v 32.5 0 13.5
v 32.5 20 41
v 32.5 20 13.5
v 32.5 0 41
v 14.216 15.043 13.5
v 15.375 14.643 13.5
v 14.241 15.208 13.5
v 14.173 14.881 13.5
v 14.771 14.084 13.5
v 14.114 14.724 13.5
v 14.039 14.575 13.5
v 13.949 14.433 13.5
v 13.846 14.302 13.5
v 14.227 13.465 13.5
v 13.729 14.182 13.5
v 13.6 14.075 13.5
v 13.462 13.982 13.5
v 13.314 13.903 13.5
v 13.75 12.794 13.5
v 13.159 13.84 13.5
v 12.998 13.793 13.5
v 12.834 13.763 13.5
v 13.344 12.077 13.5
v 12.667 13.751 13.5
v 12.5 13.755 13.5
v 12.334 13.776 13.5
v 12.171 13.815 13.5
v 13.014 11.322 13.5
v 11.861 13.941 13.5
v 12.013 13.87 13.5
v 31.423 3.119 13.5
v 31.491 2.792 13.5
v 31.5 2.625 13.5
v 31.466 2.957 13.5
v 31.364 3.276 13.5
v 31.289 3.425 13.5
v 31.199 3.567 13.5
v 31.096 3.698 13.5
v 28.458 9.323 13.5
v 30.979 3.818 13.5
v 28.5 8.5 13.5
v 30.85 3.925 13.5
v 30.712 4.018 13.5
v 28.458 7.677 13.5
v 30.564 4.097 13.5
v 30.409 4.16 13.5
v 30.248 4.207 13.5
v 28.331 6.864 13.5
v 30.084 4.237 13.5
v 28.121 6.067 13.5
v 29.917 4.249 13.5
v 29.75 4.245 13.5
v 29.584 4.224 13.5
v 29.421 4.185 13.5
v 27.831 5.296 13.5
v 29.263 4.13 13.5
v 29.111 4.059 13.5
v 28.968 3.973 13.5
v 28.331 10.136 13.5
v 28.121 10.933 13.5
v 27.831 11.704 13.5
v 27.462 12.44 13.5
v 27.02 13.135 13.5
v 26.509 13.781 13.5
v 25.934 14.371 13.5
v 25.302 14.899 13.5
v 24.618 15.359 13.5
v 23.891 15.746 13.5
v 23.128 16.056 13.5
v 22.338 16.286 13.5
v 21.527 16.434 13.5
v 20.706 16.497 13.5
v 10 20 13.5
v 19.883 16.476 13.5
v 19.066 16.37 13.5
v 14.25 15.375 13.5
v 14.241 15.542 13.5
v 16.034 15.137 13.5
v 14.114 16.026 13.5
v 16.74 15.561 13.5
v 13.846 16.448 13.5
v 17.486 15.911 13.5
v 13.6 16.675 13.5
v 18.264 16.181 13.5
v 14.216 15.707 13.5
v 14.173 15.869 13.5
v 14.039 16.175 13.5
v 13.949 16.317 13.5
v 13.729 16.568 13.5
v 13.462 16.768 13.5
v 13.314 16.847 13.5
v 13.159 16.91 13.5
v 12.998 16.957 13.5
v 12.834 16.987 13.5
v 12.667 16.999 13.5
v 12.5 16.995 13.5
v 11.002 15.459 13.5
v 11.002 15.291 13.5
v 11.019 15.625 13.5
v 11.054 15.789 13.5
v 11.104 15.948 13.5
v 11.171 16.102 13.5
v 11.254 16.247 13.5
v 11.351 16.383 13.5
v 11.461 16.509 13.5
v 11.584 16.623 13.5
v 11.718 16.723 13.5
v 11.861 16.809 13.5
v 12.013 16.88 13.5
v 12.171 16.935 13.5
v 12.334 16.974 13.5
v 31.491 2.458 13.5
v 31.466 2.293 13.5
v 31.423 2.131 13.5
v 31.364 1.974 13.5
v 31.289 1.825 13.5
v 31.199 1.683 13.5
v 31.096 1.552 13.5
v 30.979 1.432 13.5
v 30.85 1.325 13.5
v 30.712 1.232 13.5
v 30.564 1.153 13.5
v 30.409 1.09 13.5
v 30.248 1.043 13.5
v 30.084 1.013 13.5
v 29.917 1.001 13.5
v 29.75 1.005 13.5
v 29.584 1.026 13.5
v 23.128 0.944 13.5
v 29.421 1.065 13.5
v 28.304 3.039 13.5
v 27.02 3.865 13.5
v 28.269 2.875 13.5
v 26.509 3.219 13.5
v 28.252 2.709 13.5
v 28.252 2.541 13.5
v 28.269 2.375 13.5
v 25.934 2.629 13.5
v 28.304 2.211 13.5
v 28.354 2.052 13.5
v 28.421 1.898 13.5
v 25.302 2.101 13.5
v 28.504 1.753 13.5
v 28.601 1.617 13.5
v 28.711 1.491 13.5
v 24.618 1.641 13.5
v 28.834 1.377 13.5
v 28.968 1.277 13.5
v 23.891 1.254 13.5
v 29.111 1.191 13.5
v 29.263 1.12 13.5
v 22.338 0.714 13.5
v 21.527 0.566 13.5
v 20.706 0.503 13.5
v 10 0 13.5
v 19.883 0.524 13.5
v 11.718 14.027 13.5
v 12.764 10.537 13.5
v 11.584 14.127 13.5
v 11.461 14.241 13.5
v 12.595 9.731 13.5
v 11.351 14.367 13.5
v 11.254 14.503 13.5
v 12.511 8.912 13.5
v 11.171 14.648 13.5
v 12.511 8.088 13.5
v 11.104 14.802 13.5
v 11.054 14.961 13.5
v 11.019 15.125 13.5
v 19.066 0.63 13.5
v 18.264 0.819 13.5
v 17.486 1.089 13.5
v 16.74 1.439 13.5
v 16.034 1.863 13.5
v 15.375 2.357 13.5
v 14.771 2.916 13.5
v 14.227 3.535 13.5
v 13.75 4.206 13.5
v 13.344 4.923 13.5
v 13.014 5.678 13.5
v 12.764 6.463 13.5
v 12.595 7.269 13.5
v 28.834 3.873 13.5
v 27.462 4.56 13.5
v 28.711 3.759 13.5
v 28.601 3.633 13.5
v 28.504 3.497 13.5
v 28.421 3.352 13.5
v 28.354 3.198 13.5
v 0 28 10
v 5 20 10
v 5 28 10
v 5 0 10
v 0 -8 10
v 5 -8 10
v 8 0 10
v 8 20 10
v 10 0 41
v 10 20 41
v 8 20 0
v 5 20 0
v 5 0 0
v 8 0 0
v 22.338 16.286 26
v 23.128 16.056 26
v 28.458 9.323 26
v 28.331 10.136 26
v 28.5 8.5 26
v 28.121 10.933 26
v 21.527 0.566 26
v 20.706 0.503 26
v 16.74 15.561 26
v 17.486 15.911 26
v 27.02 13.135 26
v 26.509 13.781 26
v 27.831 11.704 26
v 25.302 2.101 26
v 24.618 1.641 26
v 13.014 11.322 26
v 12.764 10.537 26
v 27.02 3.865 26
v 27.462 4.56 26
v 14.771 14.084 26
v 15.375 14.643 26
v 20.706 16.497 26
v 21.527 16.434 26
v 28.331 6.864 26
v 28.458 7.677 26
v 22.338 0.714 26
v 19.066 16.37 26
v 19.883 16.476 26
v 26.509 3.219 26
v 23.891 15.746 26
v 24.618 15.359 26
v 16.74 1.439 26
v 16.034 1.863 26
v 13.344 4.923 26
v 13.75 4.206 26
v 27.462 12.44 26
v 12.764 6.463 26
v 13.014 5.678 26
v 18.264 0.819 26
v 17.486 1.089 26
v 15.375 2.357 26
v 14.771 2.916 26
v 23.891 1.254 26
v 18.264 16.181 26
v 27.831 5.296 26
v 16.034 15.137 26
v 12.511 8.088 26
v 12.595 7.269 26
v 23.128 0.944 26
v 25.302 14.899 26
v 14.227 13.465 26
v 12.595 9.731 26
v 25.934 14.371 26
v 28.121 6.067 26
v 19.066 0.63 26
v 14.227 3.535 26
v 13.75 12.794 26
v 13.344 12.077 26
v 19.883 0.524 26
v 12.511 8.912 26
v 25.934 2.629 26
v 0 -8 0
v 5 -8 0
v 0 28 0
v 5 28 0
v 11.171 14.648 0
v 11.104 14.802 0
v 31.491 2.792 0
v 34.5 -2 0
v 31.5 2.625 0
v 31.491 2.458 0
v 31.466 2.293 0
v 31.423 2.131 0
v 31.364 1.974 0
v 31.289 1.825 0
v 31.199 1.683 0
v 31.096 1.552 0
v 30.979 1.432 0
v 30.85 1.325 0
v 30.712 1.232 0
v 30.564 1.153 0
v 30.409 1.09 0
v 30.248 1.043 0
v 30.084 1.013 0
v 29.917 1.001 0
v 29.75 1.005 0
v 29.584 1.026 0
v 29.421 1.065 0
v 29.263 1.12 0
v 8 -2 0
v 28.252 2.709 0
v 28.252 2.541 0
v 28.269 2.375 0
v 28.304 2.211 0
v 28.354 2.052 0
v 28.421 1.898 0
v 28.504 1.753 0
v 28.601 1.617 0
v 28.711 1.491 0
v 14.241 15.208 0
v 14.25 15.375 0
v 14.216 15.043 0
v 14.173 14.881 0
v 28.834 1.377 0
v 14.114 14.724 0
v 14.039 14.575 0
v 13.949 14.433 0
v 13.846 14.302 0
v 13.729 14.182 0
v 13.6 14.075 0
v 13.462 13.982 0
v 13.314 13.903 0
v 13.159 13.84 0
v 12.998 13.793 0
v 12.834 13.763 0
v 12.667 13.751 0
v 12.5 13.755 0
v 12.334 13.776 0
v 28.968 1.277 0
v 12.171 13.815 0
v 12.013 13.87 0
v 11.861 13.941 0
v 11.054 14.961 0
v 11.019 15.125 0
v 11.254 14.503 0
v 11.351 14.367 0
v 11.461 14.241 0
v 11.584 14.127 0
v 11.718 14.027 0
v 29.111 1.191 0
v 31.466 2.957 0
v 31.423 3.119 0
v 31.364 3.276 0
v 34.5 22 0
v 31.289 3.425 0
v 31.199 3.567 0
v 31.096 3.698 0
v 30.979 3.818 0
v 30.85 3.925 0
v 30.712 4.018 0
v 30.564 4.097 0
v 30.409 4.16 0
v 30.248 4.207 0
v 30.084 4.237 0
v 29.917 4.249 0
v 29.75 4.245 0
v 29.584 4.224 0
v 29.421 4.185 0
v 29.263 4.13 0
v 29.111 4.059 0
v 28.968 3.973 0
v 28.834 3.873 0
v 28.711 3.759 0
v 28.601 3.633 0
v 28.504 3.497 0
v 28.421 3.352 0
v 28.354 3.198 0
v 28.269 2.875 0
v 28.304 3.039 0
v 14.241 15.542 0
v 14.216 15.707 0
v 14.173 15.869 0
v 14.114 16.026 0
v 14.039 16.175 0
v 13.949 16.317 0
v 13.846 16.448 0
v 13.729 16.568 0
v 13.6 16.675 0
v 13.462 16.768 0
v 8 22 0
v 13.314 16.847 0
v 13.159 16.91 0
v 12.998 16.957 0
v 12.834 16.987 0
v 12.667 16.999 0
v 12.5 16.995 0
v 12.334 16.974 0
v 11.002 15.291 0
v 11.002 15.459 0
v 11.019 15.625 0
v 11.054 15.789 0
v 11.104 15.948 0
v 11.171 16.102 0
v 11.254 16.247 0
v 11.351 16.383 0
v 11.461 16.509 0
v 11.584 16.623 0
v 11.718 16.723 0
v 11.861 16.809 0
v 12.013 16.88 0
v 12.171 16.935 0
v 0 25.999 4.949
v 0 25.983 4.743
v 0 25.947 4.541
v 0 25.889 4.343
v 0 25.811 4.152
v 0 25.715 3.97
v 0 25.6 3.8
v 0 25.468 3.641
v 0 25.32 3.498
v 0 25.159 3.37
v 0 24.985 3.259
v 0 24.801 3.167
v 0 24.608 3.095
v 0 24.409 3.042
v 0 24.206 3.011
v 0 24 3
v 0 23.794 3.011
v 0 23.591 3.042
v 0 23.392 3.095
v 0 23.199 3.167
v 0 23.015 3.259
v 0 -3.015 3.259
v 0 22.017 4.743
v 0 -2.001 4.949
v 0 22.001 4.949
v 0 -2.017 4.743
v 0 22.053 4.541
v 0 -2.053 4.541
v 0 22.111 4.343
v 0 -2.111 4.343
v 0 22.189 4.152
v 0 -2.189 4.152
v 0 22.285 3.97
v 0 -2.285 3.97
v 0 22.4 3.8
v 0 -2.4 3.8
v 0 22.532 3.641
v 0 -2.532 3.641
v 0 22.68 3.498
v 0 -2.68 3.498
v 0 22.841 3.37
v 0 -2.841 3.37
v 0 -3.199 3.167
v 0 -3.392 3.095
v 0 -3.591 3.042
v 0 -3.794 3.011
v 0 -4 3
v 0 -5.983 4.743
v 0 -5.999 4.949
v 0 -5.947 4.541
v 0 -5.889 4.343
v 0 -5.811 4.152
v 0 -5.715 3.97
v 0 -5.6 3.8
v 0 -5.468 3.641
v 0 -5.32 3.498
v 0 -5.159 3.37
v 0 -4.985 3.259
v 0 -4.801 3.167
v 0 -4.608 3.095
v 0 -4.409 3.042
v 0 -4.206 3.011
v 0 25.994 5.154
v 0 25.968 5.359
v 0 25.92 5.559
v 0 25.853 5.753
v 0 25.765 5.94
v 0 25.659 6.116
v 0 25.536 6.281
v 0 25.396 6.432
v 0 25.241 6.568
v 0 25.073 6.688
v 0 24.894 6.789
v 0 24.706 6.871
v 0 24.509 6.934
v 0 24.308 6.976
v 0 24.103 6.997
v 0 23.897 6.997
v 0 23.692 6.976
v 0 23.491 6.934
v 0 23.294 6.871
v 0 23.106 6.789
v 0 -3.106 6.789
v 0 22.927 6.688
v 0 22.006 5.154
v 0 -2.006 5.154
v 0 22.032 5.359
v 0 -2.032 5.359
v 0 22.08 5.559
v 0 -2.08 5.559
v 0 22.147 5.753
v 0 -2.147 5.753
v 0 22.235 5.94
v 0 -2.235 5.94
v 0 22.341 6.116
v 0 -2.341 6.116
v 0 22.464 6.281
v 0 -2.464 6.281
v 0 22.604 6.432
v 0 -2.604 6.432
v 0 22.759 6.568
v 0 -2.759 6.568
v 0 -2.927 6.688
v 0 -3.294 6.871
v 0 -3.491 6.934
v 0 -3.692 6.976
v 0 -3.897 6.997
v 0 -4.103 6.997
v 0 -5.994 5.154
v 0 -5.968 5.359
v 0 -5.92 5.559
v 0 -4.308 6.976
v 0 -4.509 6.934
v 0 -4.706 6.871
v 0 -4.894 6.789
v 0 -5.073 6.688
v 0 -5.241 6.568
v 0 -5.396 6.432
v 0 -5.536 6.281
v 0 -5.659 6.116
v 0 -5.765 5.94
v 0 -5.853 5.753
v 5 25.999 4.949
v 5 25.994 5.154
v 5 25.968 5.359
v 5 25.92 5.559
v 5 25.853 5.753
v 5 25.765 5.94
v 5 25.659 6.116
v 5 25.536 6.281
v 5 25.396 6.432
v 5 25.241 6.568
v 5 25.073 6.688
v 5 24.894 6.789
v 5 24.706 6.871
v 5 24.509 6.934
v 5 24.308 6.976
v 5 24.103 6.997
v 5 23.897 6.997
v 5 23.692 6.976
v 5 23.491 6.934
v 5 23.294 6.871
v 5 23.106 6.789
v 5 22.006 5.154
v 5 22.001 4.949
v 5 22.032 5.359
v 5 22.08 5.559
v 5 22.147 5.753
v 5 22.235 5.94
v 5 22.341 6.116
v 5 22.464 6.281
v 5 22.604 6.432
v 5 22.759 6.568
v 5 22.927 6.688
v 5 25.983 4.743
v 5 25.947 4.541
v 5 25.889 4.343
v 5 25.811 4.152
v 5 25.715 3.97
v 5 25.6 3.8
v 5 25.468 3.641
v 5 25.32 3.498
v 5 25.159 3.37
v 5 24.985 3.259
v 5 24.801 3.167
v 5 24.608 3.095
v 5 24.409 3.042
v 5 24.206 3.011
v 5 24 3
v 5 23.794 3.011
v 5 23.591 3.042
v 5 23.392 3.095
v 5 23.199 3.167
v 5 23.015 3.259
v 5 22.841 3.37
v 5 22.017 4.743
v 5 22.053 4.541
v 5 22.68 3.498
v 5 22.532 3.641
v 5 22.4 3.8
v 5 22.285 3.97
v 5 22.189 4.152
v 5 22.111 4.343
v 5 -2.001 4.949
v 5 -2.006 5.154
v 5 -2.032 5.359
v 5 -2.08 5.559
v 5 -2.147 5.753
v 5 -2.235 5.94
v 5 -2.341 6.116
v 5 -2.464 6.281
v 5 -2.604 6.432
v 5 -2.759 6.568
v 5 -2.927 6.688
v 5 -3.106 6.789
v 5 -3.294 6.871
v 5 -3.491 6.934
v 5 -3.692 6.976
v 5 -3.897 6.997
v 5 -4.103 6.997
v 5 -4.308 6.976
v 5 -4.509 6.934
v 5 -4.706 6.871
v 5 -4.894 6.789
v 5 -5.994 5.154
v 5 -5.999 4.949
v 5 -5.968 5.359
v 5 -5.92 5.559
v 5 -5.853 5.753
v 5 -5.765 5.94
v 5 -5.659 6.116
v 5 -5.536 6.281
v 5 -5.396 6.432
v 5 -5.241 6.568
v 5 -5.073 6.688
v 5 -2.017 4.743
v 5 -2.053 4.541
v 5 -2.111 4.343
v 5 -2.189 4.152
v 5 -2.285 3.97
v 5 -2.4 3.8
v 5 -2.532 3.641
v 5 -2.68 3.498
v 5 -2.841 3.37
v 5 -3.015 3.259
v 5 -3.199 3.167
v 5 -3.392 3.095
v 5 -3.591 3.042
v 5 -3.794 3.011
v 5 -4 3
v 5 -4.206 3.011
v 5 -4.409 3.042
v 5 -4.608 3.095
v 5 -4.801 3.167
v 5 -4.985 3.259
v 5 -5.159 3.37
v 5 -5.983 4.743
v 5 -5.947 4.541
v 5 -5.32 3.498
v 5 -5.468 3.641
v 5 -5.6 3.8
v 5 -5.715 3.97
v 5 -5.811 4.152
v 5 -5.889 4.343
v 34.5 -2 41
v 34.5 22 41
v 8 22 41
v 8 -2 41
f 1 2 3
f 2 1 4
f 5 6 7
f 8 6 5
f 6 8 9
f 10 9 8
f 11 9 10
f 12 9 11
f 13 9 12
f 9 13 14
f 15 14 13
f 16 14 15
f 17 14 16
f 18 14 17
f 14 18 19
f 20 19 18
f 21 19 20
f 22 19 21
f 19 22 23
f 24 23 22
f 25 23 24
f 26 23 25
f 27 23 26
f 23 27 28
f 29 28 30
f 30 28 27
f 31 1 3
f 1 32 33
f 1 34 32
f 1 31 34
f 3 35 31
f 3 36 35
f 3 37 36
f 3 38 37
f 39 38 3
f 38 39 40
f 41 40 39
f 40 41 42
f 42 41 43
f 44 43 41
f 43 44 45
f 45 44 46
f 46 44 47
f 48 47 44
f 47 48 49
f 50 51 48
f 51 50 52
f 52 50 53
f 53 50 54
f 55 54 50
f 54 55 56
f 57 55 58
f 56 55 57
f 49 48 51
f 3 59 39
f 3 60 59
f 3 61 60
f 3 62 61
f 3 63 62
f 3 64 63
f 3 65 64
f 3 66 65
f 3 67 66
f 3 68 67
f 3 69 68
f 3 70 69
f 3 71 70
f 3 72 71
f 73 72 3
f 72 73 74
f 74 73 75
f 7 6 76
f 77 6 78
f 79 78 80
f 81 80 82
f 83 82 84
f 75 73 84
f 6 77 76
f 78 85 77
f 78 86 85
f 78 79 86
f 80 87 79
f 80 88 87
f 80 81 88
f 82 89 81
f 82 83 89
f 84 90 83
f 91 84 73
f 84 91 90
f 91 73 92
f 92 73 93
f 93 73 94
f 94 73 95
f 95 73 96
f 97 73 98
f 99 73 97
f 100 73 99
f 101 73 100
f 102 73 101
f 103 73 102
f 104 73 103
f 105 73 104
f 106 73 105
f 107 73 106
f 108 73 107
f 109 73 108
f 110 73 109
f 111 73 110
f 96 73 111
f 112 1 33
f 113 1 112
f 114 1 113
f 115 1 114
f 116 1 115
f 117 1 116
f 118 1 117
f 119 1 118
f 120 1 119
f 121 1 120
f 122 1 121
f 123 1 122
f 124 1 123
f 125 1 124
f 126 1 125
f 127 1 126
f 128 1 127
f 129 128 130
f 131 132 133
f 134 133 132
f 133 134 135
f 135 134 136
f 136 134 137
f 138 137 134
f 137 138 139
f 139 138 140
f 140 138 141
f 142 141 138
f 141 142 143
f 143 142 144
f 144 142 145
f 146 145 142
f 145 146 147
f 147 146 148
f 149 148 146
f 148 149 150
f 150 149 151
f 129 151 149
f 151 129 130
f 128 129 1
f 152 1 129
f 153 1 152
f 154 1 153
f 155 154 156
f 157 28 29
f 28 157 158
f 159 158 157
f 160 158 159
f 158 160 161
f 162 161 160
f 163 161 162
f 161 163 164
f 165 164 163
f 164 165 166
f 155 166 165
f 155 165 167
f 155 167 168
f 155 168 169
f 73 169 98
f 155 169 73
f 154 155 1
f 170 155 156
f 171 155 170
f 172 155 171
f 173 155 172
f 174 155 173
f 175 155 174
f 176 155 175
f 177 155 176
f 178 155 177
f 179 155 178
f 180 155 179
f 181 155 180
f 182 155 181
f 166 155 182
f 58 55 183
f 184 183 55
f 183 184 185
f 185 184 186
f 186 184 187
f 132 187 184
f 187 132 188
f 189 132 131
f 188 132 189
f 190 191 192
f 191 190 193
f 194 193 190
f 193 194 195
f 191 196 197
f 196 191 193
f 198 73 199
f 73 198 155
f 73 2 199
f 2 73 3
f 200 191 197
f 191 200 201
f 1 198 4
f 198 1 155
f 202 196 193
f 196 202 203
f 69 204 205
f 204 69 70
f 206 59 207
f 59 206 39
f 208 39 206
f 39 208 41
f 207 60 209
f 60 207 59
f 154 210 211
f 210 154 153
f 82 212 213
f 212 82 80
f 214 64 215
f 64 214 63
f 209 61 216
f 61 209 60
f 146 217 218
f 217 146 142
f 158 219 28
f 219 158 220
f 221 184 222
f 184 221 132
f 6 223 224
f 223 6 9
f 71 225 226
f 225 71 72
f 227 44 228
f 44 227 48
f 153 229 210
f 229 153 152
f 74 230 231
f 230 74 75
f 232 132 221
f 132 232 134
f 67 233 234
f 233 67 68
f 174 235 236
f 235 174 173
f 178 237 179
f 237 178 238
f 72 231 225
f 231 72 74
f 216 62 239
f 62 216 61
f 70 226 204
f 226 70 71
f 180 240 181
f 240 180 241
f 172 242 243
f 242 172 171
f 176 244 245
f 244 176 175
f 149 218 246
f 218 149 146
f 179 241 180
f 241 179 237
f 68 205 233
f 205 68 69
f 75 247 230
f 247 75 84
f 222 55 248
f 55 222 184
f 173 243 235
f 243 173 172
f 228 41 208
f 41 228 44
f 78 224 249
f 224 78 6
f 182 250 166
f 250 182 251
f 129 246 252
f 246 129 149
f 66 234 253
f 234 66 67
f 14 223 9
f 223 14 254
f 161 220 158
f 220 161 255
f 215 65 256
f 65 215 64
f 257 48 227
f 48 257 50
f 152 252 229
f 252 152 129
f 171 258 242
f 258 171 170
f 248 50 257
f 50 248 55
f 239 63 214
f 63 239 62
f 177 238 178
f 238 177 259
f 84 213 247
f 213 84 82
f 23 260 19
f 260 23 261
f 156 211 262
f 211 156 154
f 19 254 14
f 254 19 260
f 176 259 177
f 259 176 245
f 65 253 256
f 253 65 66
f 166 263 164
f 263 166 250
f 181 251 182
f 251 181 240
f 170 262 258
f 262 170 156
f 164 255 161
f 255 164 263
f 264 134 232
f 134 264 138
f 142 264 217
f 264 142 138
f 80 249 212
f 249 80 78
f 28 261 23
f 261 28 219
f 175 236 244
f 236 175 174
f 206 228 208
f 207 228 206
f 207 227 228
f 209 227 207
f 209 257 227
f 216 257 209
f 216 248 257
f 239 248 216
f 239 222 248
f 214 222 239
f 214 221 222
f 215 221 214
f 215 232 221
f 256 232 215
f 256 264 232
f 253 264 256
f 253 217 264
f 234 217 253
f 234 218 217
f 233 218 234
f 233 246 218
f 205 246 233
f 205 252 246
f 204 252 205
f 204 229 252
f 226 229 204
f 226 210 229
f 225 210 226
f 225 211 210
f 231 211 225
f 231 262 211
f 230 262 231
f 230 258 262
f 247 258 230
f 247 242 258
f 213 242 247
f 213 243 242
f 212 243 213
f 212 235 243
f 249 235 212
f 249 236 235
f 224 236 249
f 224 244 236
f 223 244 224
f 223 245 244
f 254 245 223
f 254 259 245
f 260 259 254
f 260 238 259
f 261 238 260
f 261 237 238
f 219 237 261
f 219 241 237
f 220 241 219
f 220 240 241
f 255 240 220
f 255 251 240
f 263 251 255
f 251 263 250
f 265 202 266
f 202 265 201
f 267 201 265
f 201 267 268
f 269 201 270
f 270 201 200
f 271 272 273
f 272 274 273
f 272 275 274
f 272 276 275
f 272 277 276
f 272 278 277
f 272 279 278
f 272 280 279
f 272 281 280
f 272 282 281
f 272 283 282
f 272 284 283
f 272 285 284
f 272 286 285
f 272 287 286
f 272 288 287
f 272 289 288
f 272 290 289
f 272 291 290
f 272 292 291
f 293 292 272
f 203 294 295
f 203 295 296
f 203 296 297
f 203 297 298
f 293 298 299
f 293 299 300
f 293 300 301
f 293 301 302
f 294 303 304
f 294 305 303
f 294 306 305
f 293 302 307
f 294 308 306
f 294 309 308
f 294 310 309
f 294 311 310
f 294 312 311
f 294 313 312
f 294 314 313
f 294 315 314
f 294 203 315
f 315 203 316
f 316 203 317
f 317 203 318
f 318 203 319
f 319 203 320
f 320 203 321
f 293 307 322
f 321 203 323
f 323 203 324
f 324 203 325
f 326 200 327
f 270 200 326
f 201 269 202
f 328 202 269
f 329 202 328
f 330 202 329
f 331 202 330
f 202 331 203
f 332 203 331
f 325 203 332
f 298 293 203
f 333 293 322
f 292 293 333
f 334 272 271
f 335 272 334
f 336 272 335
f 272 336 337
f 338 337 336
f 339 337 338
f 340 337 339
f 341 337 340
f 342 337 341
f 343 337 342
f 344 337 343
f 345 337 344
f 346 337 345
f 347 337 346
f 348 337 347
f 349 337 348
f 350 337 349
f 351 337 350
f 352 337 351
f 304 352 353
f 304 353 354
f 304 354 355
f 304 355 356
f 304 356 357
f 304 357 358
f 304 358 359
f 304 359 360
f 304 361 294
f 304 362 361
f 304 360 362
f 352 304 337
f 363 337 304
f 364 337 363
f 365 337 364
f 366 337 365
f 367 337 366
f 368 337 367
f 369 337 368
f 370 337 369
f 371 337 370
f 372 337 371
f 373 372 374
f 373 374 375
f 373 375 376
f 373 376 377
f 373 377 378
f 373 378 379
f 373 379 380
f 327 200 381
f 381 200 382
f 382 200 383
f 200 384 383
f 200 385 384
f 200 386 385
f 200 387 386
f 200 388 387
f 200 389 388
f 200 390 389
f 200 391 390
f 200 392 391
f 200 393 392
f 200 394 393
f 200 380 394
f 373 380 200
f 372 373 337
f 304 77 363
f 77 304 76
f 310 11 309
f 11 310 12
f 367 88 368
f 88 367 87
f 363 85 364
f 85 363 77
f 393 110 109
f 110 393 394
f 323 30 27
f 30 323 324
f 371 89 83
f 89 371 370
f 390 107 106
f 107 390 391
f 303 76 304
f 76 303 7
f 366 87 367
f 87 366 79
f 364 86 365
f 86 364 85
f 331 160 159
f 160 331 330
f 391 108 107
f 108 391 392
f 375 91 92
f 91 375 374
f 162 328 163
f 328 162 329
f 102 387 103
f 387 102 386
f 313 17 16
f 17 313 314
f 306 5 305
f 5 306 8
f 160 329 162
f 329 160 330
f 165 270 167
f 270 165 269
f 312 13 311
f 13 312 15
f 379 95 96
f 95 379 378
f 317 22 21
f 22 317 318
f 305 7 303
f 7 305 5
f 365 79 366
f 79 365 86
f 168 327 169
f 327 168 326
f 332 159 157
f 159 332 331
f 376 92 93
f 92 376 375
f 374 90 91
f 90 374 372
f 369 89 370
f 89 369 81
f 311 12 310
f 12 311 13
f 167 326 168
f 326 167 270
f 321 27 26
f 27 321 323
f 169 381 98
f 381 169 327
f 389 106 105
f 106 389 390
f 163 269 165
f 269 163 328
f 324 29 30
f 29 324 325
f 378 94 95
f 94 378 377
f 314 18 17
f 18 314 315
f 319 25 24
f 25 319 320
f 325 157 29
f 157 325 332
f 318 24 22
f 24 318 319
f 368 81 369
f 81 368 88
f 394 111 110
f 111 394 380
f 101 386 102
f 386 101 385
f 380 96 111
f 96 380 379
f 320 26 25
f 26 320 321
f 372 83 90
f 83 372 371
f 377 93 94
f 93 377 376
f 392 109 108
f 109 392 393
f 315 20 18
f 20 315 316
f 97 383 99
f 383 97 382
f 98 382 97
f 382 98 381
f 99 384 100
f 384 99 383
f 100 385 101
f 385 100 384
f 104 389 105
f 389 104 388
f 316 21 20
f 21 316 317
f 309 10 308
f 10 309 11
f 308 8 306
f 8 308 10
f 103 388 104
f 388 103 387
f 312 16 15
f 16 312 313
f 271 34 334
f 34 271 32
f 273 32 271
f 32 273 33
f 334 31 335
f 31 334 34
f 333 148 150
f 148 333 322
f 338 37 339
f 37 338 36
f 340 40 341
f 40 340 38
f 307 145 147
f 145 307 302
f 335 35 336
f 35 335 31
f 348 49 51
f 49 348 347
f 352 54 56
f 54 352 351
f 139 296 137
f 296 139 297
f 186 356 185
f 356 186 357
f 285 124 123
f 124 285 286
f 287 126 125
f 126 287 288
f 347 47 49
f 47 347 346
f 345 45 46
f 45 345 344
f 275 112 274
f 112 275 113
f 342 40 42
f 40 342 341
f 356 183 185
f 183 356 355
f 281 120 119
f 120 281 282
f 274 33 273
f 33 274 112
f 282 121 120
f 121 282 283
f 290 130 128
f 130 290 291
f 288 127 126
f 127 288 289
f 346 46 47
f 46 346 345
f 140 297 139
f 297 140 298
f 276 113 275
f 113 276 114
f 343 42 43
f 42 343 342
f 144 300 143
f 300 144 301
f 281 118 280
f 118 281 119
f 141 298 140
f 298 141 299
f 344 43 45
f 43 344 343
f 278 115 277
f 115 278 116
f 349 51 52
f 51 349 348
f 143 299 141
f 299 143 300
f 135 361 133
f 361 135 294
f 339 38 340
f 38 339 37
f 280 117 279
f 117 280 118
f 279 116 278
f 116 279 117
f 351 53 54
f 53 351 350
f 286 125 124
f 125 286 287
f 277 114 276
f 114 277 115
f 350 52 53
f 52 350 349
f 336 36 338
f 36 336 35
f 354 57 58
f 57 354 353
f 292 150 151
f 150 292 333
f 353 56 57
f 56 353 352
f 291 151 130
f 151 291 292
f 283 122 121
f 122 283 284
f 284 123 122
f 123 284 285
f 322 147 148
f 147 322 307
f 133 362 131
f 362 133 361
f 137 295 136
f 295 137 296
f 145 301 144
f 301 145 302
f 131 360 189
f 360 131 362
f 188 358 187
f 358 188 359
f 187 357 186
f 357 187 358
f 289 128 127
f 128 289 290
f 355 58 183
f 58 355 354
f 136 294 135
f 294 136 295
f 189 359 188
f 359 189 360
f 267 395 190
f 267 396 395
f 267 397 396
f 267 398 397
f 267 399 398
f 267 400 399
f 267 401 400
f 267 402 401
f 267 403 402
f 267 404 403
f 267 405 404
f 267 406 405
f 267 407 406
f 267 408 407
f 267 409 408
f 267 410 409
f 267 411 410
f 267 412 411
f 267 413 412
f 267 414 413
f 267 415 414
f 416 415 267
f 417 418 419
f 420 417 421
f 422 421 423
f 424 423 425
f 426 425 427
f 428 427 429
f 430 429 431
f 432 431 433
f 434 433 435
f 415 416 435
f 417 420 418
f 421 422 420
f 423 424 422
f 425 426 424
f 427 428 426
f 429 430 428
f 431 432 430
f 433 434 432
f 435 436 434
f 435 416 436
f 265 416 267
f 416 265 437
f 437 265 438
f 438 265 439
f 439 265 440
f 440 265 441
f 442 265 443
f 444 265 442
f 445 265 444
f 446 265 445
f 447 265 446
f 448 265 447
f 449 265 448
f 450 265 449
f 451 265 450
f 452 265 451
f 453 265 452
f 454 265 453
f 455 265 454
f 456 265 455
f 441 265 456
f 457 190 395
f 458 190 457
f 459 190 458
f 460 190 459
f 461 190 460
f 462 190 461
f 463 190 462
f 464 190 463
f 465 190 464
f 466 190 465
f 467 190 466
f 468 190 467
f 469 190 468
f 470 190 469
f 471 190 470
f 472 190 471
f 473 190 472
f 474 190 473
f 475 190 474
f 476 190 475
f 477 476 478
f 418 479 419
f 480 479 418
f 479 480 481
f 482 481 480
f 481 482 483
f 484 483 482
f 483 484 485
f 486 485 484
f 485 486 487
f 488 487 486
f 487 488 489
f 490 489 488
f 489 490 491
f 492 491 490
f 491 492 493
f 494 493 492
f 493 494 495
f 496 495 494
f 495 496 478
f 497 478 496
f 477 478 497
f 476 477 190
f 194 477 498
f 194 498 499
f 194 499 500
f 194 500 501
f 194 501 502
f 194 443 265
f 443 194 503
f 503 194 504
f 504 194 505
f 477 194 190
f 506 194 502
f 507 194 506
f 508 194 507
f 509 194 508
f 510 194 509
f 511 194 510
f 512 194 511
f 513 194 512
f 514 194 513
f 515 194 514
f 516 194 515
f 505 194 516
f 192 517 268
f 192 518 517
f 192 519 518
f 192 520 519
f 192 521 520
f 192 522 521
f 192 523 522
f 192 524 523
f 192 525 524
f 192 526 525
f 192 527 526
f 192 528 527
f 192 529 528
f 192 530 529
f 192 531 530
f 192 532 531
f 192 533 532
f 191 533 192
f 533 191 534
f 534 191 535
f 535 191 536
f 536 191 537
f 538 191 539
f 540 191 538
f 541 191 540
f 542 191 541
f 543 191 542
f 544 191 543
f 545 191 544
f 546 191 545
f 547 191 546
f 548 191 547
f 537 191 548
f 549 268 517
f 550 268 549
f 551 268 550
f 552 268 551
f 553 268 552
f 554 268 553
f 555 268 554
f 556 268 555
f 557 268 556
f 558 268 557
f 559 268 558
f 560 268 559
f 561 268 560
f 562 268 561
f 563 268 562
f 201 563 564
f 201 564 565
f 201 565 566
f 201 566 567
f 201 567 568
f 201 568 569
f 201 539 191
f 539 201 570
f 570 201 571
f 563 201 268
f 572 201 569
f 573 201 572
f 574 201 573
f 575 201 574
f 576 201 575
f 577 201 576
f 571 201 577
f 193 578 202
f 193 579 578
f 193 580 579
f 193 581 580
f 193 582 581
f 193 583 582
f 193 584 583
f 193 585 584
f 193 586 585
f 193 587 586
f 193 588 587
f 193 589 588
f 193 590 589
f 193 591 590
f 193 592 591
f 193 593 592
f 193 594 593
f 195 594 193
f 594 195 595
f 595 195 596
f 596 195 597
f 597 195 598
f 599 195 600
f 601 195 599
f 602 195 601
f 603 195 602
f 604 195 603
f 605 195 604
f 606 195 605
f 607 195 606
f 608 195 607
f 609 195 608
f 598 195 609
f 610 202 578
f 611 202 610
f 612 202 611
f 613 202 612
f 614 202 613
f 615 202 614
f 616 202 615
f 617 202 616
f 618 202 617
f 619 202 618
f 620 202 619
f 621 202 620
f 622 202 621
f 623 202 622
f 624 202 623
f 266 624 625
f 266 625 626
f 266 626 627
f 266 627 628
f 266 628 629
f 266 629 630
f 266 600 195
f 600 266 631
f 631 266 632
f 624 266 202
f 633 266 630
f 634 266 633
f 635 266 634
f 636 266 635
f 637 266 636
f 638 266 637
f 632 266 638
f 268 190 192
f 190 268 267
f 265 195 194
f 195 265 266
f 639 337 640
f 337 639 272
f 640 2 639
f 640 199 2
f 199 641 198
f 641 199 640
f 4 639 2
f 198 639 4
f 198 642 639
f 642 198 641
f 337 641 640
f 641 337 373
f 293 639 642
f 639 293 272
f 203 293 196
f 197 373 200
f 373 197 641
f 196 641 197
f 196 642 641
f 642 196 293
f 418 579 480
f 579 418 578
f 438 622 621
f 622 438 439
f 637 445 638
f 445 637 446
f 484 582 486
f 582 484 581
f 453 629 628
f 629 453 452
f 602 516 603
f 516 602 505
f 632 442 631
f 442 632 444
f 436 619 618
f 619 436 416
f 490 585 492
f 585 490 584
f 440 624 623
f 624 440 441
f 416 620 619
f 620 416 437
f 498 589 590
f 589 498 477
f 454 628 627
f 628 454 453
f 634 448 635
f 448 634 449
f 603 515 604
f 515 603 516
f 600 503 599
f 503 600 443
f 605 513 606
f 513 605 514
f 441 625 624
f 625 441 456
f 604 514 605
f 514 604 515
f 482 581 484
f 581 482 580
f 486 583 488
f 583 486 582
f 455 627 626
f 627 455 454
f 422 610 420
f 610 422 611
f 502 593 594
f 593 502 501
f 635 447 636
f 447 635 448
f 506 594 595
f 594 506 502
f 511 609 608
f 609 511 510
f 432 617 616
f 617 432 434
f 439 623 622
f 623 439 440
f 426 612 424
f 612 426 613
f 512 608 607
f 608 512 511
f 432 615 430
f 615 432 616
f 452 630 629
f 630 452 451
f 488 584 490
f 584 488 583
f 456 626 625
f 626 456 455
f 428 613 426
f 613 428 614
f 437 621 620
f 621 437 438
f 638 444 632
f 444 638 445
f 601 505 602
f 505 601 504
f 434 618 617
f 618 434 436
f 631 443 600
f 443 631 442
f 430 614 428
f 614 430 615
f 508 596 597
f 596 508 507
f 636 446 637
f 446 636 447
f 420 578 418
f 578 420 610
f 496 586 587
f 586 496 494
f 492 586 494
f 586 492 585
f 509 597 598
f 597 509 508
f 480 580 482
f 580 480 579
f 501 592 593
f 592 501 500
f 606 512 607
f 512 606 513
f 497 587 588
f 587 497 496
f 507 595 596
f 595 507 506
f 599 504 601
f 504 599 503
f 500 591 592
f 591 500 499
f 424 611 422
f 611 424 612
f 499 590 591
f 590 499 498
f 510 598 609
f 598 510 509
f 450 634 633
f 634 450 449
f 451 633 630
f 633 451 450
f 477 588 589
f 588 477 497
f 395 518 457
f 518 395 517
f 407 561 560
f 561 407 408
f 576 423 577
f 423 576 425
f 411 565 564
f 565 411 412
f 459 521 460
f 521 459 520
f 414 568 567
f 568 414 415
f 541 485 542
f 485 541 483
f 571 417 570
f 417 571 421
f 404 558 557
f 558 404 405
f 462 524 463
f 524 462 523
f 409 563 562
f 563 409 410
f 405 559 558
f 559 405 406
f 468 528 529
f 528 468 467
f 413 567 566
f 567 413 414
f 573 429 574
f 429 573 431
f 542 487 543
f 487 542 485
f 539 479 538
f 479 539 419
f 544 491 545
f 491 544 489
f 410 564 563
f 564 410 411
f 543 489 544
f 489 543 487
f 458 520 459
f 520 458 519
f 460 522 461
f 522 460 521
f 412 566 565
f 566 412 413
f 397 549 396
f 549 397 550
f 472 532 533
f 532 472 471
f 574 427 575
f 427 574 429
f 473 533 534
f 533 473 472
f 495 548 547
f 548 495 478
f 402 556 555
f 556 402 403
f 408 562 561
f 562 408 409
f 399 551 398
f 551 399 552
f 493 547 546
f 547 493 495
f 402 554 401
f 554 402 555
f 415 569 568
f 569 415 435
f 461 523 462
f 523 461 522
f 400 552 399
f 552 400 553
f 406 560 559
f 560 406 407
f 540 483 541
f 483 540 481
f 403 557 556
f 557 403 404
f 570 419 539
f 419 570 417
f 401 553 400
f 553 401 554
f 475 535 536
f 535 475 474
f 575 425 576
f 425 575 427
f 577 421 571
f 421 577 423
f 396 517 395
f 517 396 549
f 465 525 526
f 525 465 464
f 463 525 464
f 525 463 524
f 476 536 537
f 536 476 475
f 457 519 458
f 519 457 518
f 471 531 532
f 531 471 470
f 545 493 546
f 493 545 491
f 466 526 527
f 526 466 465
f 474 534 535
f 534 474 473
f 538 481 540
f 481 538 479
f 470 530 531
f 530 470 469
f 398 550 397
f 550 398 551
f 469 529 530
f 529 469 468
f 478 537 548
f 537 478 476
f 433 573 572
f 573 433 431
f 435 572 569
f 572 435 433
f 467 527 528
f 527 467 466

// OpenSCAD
// file: components-lib.scad
//I feel like this is going to blow up over time. 
/*
TODO:
-Finish Maple
-Add 


*/

$fn =61;

module paulo_motor(holes){
	difference(){
		union(){	
			cylinder(r=16/2, h=2);//bump
			translate([0,0,2])cylinder(r=35.75/2, h= 57);//motor
			translate([0,0,59])cylinder(r=32/2, h=28);//planetary
			translate([0,0,87])cylinder(r=20/2, h=3.5);//bump
			translate([0,0,90.5])cylinder(r=6/2, h=16);//shaft

			if(holes ==1){
				translate([0,-25/2,87])cylinder(r=3/2, h=19.5);//screw hole
				translate([-25/2,0,87])cylinder(r=3/2, h=19.5);//screw hole
				translate([25/2,0,87])cylinder(r=3/2, h=19.5);//screw hole
				translate([0,25/2,87])cylinder(r=3/2, h=19.5);//screw hole			
			}

		}
		translate([2.5,-3,94])cube([0.5,6,12.5]);//flat
	}
}
module paulo_wheel(){
	difference(){
		cylinder(r=72/2, h = 18.5);
		translate([0,0,-1])cylinder(r=4/2, h= 18.5+2);
	}

}
module paulo_hub(holes){
	difference(){
		union(){	
				cylinder(r=22/2, h=1.6);
				cylinder(r=12.75/2, h=19);

				if(holes==1)for(i = [0:360/5:360]){
					rotate([0,0,i])translate([8.5,0,-5])cylinder(r=2/2, h=10);
				}

		}
		translate([0,0,-1])cylinder(r=8.5/2, h=2);
		translate([0,0,-1])cylinder(r=3/2, h=19+2);
		translate([0,0,6])cylinder(r=6.25/2, h=13+1);
		translate([0,0,12.5])rotate([0,90,0])cylinder(r=5/2, h=12.75/2);

		if(holes==0)for(i = [0:360/5:360]){
			rotate([0,0,i])translate([8.5,0,-1])cylinder(r=2/2, h=1.6+2);
		}
	}

}
module maple(holes){
boardThick=3;
	difference(){
		union(){
			color("red"){
				cube([50,53.3,boardThick]);
				hull(){
					translate([52.5,5,0])rotate([0,0,135])cube([5,5,boardThick]);
					translate([52.5,38,0])rotate([0,0,135])cube([5,5,boardThick]);
				}
			}
			if(holes==1){
				translate([4,4,-1])cylinder(r=1.5, h=boardThick*10,center=true);
				translate([4,53.3-4,-1])cylinder(r=1.5, h=boardThick*10,center=true);
				translate([50,7.6,-1])cylinder(r=1.5, h=boardThick*10,center=true);
				translate([50,7.6+27.9,-1])cylinder(r=1.5, h=boardThick*10,center=true);
			}

		}
		if(holes==0){
			translate([4,4,-1])cylinder(r=1.5, h=boardThick+2);
			translate([4,53.3-4,-1])cylinder(r=1.5, h=boardThick+2);
			translate([50,7.6,-1])cylinder(r=1.5, h=boardThick+2);
			translate([50,7.6+27.9,-1])cylinder(r=1.5, h=boardThick+2);
		}
	}
}

module pololu_wheel(dia, width, holes){
	treadThick = 3;
	spokes = 5;
	spokesThick = 4;
	spokesWidth = 8;
	difference(){
		union(){
			color("black")difference(){	//Tread
				cylinder(r=dia/2, h=width);
				translate([0,0,-1])cylinder(r=dia/2-treadThick, h=width+2);
			}
			color("blue")difference(){	//Rim
				cylinder(r=dia/2-treadThick, h=width);
				translate([0,0,-1])cylinder(r=dia/2-treadThick-3, h=width+2);
			}
			color("blue")for( i = [0: 360/spokes :360]){	//Spokes
				rotate([0,0,i])translate([0,(dia/2-treadThick-3)/2,width/2])cube([spokesWidth,dia/2-treadThick-3,spokesThick],center=true);
			}
			color("blue")translate([0,0,width/2])cylinder(r=10, h=spokesThick, center = true);	//Center
		}
		color("blue"){
			translate([1/4*25.4,0,0])cylinder(r=1.5, h=width);
			translate([-1/4*25.4,0,0])cylinder(r=1.5, h=width);
			cylinder(r=1.5, h=width);
			translate([-0.5,-11,0])cube([1,11,width]);
		}
	}
}

module ultrasonic(holes){
	difference(){
		union(){
			color("green")cube([22.5,20,3.5]);
			color("black")translate([10.5,8.5,3.5])cylinder(r=8, h=12.5);
			color("black")translate([4,17.5,-10])cube([18.5,2.5,10]);
			color("grey")translate([12.5,9,-10])cube([7.75,7.75,10]);
			if(holes==1){
				translate([3.25/2+1,20-3-3.25/2,-15])cylinder(r=3.25/2, h=30);
				translate([22.5-3.25/2-1,3.25/2+1,-15])cylinder(r=3.25/2, h=30);
			}
		}

		if(holes==0){
			translate([3.25/2+1,20-3-3.25/2,-1])cylinder(r=3.25/2, h=5.5);
			translate([22.5-3.25/2-1,3.25/2+1,-1])cylinder(r=3.25/2, h=5.5);
		}
	}
}

module micro_motor(){
	difference(){
		union(){
			color("gold")cube([12,9,10]);
			color("silver")translate([6,-9.27,5])rotate([-90,0,0])cylinder(r=1.5, h=9.27);
			color("silver")translate([6,24,5])rotate([-90,0,0])cylinder(r=2.5, h=2);
			color("silver")translate([6+3.5,24,6])rotate([-90,0,0])cube([0.3,2,2]);
			color("silver")translate([6-3.5,24,6])rotate([-90,0,0])cube([0.3,2,2]);
			color("silver")translate([6,9,5])rotate([-90,0,0])cylinder(r=6, h=15);
			color("silver")translate([6,24,5])rotate([-90,0,0])cylinder(r=0.5, h=6.5);
		}
		color("silver")translate([0,9,10])cube([12,16,3]);
		color("silver")translate([0,9,-3])cube([12,16,3]);
		color("silver")translate([4,-10,6])cube([4,9.99,3]);
	}
}

module 2slipo(){
	color("blue")cube([35,70,13]);
}

module pololu_hub(holes){

}

module ball_caster(holes){
	difference(){
		union(){
			color("silver")translate([0,0,-3/8*25.4/2+0.4*25.4])sphere(r=3/8*25.4/2);
			color("black")hull(){
				translate([0.53*25.4/2,0,0])cylinder(r=0.22*25.4/2, h=2);
				translate([-0.53*25.4/2,0,0])cylinder(r=0.22*25.4/2, h=2);
			}
			if(holes==1){
				translate([0.53*25.4/2,0,-10])cylinder(r=0.09*25.4/2, h=20);
				translate([-0.53*25.4/2,0,-10])cylinder(r=0.09*25.4/2, h=20);
			}
		}
		if(holes==0){
			translate([0.53*25.4/2,0,-1])cylinder(r=0.09*25.4/2, h=4);
			translate([-0.53*25.4/2,0,-1])cylinder(r=0.09*25.4/2, h=4);
		}
	}
}

module encoder(){
	difference(){
		union(){
		}
	}
}

module small_tamiya_wheel(holes){
	//difference(){
		union(){
			cylinder(r=18, h=3.5);
		}
	//}
}
module ir_sensor(holes){
	color("grey"){
		difference(){
			union(){
				translate([-9.65,3.75,0])cube([18.9,29.5,9.2]);
				translate([-3.75,3.75,0])cube([8.4,29.5,9.2+4.3]);
				translate([-3.75+0.6,3.75,0])cube([7.2,29.5,9.2+6.3]);
				translate([-10-9.65,3.75+9.7,3.3])cube([10,10.1,6]);
				hull(){
					cylinder(r=3.75, h=2);
					translate([0,37,0])cylinder(r=3.75, h=2);
				}
				if(holes==1){
					cylinder(r=3.2/2, h=20, center=true);
					translate([0,37,0])cylinder(r=3.2/2, h=20, center=true);
				}
			}
			if(holes==0){
				translate([0,0,-1])cylinder(r=3.2/2, h=2+2);
				translate([0,37,-1])cylinder(r=3.2/2, h=2+2);
			}
		}
	}
}

//ir_sensor(0);
//small_tamiya_wheel();
//ball_caster(0);
//micro_motor();
//paulo_motor(0);
//paulo_wheel();
//paulo_hub(0);
//pololu_wheel(70, 8, 1);
//ultrasonic(0);
//maple(0);
//2slipo();
// main file
include <components-lib.scad>;

thickness = 10;
height = 10; //to bottom of PCB
holeDia = 4;
baseThick = 5;
shieldThick = 2;
shieldExtension = 15;

module ultrasonic_mount(){
	difference(){
		union(){
			cube([22.5+height,20,thickness]);
			translate([0,-holeDia*2,0])cube([baseThick,20+holeDia*4,thickness]);
			//shield
			translate([height+22.5,-shieldThick,0])cube([shieldThick,20+shieldThick*2,thickness+16+shieldExtension]);
			translate([height-shieldThick,-shieldThick,0])cube([shieldThick*2+22.5,shieldThick,thickness+16+shieldExtension]);
			translate([height-shieldThick,20,0])cube([shieldThick*2+22.5,shieldThick,thickness+16+shieldExtension]);
			translate([height-shieldThick,-shieldThick,0])cube([shieldThick,20+shieldThick*2,thickness+16+shieldExtension]);
			
		}
		translate([height,0,thickness])ultrasonic(1);
		translate([-1,-holeDia,thickness/2])rotate([0,90,0])cylinder(r= holeDia/2, h= baseThick+2);
		translate([-1,holeDia+20,thickness/2])rotate([0,90,0])cylinder(r= holeDia/2, h= baseThick+2);
	}
}
union(){
translate([height,0,thickness])ultrasonic(0);
ultrasonic_mount();
}
